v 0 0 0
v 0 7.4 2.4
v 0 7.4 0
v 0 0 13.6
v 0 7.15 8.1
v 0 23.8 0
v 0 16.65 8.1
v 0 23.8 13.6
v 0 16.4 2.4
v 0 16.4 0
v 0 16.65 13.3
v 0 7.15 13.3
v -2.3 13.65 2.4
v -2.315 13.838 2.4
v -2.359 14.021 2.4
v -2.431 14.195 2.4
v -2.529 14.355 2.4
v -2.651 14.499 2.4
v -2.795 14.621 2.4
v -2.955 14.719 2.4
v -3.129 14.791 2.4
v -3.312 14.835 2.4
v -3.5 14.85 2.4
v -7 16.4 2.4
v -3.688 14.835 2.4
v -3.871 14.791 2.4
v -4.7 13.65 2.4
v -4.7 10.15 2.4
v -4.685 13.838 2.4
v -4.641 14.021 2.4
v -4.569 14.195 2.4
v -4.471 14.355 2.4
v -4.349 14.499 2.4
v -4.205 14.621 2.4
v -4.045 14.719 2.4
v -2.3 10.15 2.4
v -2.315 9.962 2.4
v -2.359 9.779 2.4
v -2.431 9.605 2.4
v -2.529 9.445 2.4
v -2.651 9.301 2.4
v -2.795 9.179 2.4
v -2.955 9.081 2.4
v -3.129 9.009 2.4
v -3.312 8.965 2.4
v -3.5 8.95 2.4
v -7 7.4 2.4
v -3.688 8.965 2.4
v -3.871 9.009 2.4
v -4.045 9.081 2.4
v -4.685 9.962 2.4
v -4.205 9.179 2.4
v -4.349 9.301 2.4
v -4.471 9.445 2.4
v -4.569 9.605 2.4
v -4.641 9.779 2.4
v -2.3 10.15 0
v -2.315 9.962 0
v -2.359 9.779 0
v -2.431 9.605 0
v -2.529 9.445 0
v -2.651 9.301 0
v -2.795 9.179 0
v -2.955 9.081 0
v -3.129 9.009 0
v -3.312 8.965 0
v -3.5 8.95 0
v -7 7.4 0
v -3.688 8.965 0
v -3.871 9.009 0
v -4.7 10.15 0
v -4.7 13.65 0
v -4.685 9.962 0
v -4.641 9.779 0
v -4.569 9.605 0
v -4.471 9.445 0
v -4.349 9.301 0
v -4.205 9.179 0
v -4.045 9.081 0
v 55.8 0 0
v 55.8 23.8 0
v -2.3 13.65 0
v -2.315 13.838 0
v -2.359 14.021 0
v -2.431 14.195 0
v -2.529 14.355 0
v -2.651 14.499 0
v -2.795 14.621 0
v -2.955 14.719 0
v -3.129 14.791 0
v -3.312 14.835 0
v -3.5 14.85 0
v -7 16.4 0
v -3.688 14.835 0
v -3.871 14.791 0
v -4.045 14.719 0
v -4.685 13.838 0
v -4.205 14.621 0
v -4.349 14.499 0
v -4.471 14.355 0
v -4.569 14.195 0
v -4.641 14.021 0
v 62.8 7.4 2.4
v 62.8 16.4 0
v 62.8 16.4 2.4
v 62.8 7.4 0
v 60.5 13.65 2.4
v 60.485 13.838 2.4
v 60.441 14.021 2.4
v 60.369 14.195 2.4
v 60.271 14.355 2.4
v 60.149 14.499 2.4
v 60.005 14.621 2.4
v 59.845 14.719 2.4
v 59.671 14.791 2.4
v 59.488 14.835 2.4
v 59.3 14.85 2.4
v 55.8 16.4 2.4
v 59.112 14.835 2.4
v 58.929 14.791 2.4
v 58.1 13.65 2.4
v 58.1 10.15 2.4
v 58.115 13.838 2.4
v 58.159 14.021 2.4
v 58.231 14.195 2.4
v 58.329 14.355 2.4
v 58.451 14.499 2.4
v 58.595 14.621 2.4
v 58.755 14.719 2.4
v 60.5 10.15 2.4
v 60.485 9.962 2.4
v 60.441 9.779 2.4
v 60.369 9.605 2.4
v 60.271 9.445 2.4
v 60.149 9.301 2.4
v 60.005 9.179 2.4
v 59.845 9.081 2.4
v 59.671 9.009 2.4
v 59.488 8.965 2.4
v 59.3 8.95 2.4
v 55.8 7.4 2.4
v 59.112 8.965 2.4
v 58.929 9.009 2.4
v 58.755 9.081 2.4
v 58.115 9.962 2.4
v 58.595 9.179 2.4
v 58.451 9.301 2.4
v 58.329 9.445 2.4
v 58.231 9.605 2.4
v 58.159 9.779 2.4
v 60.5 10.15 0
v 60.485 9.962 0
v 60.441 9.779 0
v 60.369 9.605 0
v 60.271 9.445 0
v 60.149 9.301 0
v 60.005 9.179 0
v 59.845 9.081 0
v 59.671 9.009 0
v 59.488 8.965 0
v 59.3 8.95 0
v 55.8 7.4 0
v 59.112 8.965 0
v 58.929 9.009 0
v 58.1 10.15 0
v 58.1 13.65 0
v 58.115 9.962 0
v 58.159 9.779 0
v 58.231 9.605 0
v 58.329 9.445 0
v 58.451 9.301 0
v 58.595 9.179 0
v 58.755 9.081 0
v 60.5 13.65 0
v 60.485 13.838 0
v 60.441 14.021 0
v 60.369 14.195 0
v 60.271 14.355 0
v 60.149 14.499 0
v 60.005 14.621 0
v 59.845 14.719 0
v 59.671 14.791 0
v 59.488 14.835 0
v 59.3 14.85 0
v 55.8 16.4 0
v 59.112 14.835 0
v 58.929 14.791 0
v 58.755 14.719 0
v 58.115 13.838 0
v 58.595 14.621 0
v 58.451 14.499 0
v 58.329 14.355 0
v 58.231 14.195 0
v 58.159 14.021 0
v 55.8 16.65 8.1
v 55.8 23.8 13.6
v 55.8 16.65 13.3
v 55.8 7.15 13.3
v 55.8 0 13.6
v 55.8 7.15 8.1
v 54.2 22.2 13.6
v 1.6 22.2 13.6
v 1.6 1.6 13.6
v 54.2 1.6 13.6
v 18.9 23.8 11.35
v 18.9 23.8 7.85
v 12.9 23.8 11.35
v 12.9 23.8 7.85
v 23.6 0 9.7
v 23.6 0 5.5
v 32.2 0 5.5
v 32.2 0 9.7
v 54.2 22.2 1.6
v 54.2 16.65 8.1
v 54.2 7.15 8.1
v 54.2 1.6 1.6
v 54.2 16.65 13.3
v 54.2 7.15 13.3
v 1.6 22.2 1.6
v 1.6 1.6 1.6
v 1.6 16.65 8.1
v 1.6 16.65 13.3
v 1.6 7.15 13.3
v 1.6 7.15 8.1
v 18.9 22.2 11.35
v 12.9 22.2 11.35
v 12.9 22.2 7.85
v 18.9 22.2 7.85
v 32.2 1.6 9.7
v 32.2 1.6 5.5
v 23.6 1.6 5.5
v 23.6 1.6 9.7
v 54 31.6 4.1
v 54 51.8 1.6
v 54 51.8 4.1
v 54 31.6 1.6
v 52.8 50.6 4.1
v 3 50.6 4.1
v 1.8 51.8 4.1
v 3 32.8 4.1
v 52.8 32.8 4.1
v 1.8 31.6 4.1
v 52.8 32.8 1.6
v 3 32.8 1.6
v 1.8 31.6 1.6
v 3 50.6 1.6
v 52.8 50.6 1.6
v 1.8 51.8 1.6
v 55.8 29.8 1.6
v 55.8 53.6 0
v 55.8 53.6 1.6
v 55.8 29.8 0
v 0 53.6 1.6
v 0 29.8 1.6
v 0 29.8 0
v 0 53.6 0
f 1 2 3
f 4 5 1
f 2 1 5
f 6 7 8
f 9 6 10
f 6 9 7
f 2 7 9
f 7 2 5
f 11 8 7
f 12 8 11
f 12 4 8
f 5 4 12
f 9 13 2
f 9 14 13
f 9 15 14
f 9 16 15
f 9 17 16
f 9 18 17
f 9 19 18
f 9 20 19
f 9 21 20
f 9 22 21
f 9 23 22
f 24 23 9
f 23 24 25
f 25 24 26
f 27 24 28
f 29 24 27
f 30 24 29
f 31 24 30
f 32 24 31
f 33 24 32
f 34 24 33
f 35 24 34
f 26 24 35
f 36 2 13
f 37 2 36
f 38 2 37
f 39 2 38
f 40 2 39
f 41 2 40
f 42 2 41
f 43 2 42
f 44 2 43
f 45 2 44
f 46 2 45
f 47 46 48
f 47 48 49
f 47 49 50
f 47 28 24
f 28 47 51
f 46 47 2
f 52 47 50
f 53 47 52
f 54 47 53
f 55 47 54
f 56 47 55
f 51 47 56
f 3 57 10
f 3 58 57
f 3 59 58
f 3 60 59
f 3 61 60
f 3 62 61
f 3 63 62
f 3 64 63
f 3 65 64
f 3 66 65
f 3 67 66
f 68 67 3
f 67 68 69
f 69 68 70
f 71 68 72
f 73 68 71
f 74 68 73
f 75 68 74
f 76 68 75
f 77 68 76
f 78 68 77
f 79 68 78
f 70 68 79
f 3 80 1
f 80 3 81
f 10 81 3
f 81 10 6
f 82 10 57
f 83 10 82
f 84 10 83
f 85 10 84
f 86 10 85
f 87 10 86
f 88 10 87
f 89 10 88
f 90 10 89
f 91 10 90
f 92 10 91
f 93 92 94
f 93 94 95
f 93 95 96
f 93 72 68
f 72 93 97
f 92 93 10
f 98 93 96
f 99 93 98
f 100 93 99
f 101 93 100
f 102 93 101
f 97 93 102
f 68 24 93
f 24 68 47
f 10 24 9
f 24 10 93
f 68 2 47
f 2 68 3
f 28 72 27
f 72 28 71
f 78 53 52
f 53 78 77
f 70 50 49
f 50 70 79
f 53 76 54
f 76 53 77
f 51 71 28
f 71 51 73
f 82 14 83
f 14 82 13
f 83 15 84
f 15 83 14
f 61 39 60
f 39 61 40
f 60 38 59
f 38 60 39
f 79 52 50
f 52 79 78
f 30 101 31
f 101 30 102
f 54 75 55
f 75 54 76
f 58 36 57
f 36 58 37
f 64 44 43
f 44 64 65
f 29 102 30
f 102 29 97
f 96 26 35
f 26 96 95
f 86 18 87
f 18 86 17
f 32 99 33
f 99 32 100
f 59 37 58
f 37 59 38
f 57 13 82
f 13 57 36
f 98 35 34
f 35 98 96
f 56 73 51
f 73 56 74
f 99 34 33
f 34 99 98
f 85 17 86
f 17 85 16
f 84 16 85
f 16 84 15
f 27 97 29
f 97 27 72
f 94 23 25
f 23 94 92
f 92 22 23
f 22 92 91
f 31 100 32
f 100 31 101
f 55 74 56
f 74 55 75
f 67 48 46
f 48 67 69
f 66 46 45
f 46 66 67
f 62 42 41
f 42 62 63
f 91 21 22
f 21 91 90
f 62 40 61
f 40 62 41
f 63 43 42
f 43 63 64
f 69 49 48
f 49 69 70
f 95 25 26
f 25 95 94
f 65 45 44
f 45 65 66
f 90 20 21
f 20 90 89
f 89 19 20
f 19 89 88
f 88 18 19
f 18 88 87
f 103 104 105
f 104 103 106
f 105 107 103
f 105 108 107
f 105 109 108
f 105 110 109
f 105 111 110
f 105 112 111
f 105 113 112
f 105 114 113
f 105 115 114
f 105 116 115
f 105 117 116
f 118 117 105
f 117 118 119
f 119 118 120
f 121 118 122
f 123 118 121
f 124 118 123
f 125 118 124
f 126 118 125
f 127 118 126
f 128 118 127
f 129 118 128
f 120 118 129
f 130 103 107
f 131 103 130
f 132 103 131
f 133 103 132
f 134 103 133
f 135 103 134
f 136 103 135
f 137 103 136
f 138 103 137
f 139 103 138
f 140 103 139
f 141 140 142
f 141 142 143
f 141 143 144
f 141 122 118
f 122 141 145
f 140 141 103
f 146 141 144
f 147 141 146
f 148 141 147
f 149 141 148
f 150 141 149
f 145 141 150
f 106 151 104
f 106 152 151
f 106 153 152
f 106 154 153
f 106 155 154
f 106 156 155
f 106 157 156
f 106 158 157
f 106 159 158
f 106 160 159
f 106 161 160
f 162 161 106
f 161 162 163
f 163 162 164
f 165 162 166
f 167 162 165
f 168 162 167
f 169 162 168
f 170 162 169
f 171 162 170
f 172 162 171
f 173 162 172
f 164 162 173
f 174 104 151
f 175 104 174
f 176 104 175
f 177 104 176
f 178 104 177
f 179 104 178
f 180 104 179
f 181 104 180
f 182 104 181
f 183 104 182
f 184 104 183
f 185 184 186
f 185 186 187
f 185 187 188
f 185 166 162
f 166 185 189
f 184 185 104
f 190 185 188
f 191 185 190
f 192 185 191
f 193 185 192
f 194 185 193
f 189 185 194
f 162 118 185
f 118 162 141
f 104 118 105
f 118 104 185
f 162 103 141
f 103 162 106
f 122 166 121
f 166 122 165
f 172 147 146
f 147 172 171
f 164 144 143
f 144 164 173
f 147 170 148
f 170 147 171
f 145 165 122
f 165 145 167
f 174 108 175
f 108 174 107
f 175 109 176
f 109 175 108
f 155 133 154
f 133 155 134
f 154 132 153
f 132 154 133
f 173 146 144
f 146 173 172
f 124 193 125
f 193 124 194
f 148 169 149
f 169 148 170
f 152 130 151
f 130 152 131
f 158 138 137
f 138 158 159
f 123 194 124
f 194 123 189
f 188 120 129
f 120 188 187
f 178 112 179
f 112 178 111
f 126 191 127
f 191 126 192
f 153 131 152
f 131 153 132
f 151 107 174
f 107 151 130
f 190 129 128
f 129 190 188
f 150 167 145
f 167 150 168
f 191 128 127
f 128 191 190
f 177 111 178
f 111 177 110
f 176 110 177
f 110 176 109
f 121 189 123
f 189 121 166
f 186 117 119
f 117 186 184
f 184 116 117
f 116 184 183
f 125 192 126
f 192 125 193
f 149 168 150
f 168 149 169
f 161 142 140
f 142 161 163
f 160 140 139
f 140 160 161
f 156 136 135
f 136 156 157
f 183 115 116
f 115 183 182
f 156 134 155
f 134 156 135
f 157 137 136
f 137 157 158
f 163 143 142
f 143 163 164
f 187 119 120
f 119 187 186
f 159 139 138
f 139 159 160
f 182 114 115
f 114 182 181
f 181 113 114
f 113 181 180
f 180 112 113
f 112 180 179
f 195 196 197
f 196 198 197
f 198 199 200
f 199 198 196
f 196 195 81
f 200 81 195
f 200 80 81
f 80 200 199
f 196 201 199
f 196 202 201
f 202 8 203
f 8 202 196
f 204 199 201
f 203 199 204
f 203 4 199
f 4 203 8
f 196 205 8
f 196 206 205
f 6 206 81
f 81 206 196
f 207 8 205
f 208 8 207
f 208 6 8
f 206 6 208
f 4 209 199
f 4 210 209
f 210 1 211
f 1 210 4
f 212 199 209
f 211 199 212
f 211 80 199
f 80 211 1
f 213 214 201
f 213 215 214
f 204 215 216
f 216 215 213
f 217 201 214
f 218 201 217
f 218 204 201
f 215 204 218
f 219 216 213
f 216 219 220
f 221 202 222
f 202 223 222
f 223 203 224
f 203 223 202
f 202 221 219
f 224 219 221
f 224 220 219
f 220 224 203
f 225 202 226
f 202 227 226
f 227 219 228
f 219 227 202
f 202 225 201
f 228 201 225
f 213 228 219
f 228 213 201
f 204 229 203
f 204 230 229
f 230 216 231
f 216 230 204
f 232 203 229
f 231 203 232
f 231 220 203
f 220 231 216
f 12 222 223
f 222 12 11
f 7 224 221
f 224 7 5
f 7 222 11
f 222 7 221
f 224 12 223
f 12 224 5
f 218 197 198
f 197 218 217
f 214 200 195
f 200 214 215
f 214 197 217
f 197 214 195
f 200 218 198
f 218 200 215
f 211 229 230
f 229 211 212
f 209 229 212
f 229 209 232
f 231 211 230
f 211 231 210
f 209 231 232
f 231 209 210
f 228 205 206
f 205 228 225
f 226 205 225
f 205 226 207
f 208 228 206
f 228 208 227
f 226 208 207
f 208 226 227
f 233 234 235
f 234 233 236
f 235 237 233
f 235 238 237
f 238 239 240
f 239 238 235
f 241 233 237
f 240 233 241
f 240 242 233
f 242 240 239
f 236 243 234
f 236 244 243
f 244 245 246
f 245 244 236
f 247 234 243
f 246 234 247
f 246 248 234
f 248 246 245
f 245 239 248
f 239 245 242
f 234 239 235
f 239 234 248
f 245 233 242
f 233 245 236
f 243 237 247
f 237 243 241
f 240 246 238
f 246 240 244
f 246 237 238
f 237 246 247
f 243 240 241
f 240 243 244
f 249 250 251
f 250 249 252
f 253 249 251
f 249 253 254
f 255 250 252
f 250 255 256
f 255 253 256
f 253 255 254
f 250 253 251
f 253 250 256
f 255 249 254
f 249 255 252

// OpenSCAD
// SpinLite - scatolina parametrica per l'elettronica (OpenSCAD, unita in mm).
// Licenza MIT, come il resto del progetto.
//
// Contiene: ESP32-C3 SuperMini, modulo TP4056, LiPo piccola, interruttore a slitta.
// Disposizione: la LiPo sta sul fondo; sopra, affiancate, SuperMini (a sinistra,
// con la USB-C sul lato corto sinistro) e TP4056 (a destra, USB-C sul lato corto
// destro). Interruttore sul lato anteriore, cavi del sensore sul lato posteriore.
// Pensata per stampa FDM SENZA supporti: scatola con l'apertura in alto,
// coperchio stampato a faccia in giu (con il bordo di incastro verso l'alto).

// ---- Cosa generare: "box", "lid" oppure "both" ----
part = "both";

// ---- Spessori e tolleranze ----
wall      = 1.6;  // spessore pareti
floor_t   = 1.6;  // spessore fondo
lid_t     = 1.6;  // spessore piastra del coperchio
lip_t     = 1.2;  // spessore del bordo di incastro del coperchio
lip_h     = 2.5;  // altezza del bordo di incastro
clearance = 0.2;  // gioco tra coperchio e scatola (regolalo sulla tua stampante)
fit       = 0.6;  // gioco totale aggiunto alle dimensioni dei componenti
gap       = 1.5;  // spazio tra SuperMini e TP4056

// ---- ESP32-C3 SuperMini (USB-C su un lato corto) ----
sm_l      = 22.5; // lunghezza (lungo X)
sm_w      = 18;   // larghezza
sm_h      = 3.5;  // altezza totale (PCB + componenti)
sm_usb_w  = 9.5;  // larghezza apertura USB-C
sm_usb_h  = 4.0;  // altezza apertura USB-C (parte dal piano del PCB)

// ---- TP4056 con protezione (USB-C su un lato corto) ----
tp_l      = 28;
tp_w      = 17;
tp_h      = 4;
tp_usb_w  = 9.5;
tp_usb_h  = 4.0;

// ---- LiPo (default: 300 mAh) ----
lipo_l    = 30;
lipo_w    = 20;
lipo_h    = 6;
foam      = 1;    // spazio per nastro biadesivo o gommapiuma sopra la LiPo

// ---- Interruttore a slitta (foro rettangolare sul lato anteriore) ----
sw_w      = 8.6;  // larghezza del foro (lungo X)
sw_h      = 4.2;  // altezza del foro
sw_x      = 0;    // posizione X del centro, relativa al centro scatola

// ---- Cavi verso il sensore (lato posteriore) ----
cable_w   = 6;    // larghezza del foro
cable_h   = 3.5;  // altezza del foro
cable_x   = -12;  // posizione X del centro, relativa al centro scatola

// ---- Finestrella OLED 128x32 (modulo ~38x12, area visibile ~23x6) ----
oled      = false; // true per aprire la finestrella e alzare la scatola
oled_win_w = 23.5;
oled_win_h = 6.5;
oled_extra_h = 3;  // altezza in piu per il modulo sotto il coperchio
oled_x    = -10;   // posizione X della finestrella, relativa al centro scatola
oled_y    = 0;     // posizione Y, relativa al centro scatola

// ---- Fissaggio al supporto del sensore ----
ear_w     = 9;    // larghezza delle linguette
ear_l     = 7;    // sporgenza delle linguette
ear_t     = 2.4;  // spessore delle linguette
screw_d   = 2.4;  // foro per vite M2
ear_slot  = 3.5;  // lunghezza asola per fascetta (0 = solo foro tondo)

$fn = 40;

// ---------------------------------------------------------------------------
// Dimensioni derivate
// ---------------------------------------------------------------------------
inner_x = max(sm_l + gap + tp_l, lipo_l) + fit;
inner_y = max(sm_w, tp_w, lipo_w) + fit;
inner_z = lipo_h + foam + max(sm_h, tp_h) + 1 + (oled ? oled_extra_h : 0);
outer_x = inner_x + 2 * wall;
outer_y = inner_y + 2 * wall;
box_h   = floor_t + inner_z;
z_board = floor_t + lipo_h + foam; // quota del piano delle schede

// Ritaglio rettangolare centrato in X e in Z; lo spessore e size[1] (lungo Y)
module cutout(size) {
    translate([-size[0] / 2, 0, -size[2] / 2]) cube(size);
}

// ---------------------------------------------------------------------------
// Scatola
// ---------------------------------------------------------------------------
module ear(side) { // side = -1 (sinistra) o +1 (destra)
    x0 = side < 0 ? -ear_l : outer_x;
    translate([x0, outer_y / 2 - ear_w / 2, 0]) difference() {
        cube([ear_l, ear_w, ear_t]);
        // foro o asola per vite M2 / fascetta
        translate([ear_l / 2, ear_w / 2, -0.1]) hull() {
            translate([0, -ear_slot / 2, 0]) cylinder(d = screw_d, h = ear_t + 0.2);
            translate([0,  ear_slot / 2, 0]) cylinder(d = screw_d, h = ear_t + 0.2);
        }
    }
}

module box() {
    difference() {
        union() {
            cube([outer_x, outer_y, box_h]);
            ear(-1);
            ear(1);
        }
        // cavita interna
        translate([wall, wall, floor_t]) cube([inner_x, inner_y, inner_z + 0.01]);

        // USB-C della SuperMini: parete sinistra
        translate([-0.1, outer_y / 2 - sm_usb_w / 2, z_board - 0.5])
            cube([wall + 0.2, sm_usb_w, sm_usb_h + 1.2]);
        // USB-C del TP4056: parete destra
        translate([outer_x - wall - 0.1, outer_y / 2 - tp_usb_w / 2, z_board - 0.5])
            cube([wall + 0.2, tp_usb_w, tp_usb_h + 1.2]);

        // interruttore: parete anteriore (y = 0)
        translate([outer_x / 2 + sw_x, -0.1, floor_t + inner_z / 2])
            cutout([sw_w, wall + 0.2, sw_h]);

        // cavi sensore: parete posteriore (y = outer_y)
        translate([outer_x / 2 + cable_x, outer_y - wall - 0.1, z_board + 1])
            cutout([cable_w, wall + 0.2, cable_h]);
    }
}

// ---------------------------------------------------------------------------
// Coperchio: piastra + bordo che entra nella scatola con gioco `clearance`.
// Stampato con la piastra sul piatto e il bordo verso l'alto.
// ---------------------------------------------------------------------------
module lid() {
    difference() {
        union() {
            cube([outer_x, outer_y, lid_t]);
            // bordo di incastro: anello che sta dentro le pareti
            translate([wall + clearance, wall + clearance, lid_t]) difference() {
                cube([inner_x - 2 * clearance, inner_y - 2 * clearance, lip_h]);
                translate([lip_t, lip_t, -0.1])
                    cube([inner_x - 2 * clearance - 2 * lip_t,
                          inner_y - 2 * clearance - 2 * lip_t, lip_h + 0.2]);
            }
        }
        if (oled) {
            translate([outer_x / 2 + oled_x - oled_win_w / 2,
                       outer_y / 2 + oled_y - oled_win_h / 2, -0.1])
                cube([oled_win_w, oled_win_h, lid_t + 0.2]);
        }
    }
}

// ---------------------------------------------------------------------------
// Uscita
// ---------------------------------------------------------------------------
if (part == "box") {
    box();
} else if (part == "lid") {
    lid();
} else {
    box();
    translate([0, outer_y + 6, 0]) lid();
}
